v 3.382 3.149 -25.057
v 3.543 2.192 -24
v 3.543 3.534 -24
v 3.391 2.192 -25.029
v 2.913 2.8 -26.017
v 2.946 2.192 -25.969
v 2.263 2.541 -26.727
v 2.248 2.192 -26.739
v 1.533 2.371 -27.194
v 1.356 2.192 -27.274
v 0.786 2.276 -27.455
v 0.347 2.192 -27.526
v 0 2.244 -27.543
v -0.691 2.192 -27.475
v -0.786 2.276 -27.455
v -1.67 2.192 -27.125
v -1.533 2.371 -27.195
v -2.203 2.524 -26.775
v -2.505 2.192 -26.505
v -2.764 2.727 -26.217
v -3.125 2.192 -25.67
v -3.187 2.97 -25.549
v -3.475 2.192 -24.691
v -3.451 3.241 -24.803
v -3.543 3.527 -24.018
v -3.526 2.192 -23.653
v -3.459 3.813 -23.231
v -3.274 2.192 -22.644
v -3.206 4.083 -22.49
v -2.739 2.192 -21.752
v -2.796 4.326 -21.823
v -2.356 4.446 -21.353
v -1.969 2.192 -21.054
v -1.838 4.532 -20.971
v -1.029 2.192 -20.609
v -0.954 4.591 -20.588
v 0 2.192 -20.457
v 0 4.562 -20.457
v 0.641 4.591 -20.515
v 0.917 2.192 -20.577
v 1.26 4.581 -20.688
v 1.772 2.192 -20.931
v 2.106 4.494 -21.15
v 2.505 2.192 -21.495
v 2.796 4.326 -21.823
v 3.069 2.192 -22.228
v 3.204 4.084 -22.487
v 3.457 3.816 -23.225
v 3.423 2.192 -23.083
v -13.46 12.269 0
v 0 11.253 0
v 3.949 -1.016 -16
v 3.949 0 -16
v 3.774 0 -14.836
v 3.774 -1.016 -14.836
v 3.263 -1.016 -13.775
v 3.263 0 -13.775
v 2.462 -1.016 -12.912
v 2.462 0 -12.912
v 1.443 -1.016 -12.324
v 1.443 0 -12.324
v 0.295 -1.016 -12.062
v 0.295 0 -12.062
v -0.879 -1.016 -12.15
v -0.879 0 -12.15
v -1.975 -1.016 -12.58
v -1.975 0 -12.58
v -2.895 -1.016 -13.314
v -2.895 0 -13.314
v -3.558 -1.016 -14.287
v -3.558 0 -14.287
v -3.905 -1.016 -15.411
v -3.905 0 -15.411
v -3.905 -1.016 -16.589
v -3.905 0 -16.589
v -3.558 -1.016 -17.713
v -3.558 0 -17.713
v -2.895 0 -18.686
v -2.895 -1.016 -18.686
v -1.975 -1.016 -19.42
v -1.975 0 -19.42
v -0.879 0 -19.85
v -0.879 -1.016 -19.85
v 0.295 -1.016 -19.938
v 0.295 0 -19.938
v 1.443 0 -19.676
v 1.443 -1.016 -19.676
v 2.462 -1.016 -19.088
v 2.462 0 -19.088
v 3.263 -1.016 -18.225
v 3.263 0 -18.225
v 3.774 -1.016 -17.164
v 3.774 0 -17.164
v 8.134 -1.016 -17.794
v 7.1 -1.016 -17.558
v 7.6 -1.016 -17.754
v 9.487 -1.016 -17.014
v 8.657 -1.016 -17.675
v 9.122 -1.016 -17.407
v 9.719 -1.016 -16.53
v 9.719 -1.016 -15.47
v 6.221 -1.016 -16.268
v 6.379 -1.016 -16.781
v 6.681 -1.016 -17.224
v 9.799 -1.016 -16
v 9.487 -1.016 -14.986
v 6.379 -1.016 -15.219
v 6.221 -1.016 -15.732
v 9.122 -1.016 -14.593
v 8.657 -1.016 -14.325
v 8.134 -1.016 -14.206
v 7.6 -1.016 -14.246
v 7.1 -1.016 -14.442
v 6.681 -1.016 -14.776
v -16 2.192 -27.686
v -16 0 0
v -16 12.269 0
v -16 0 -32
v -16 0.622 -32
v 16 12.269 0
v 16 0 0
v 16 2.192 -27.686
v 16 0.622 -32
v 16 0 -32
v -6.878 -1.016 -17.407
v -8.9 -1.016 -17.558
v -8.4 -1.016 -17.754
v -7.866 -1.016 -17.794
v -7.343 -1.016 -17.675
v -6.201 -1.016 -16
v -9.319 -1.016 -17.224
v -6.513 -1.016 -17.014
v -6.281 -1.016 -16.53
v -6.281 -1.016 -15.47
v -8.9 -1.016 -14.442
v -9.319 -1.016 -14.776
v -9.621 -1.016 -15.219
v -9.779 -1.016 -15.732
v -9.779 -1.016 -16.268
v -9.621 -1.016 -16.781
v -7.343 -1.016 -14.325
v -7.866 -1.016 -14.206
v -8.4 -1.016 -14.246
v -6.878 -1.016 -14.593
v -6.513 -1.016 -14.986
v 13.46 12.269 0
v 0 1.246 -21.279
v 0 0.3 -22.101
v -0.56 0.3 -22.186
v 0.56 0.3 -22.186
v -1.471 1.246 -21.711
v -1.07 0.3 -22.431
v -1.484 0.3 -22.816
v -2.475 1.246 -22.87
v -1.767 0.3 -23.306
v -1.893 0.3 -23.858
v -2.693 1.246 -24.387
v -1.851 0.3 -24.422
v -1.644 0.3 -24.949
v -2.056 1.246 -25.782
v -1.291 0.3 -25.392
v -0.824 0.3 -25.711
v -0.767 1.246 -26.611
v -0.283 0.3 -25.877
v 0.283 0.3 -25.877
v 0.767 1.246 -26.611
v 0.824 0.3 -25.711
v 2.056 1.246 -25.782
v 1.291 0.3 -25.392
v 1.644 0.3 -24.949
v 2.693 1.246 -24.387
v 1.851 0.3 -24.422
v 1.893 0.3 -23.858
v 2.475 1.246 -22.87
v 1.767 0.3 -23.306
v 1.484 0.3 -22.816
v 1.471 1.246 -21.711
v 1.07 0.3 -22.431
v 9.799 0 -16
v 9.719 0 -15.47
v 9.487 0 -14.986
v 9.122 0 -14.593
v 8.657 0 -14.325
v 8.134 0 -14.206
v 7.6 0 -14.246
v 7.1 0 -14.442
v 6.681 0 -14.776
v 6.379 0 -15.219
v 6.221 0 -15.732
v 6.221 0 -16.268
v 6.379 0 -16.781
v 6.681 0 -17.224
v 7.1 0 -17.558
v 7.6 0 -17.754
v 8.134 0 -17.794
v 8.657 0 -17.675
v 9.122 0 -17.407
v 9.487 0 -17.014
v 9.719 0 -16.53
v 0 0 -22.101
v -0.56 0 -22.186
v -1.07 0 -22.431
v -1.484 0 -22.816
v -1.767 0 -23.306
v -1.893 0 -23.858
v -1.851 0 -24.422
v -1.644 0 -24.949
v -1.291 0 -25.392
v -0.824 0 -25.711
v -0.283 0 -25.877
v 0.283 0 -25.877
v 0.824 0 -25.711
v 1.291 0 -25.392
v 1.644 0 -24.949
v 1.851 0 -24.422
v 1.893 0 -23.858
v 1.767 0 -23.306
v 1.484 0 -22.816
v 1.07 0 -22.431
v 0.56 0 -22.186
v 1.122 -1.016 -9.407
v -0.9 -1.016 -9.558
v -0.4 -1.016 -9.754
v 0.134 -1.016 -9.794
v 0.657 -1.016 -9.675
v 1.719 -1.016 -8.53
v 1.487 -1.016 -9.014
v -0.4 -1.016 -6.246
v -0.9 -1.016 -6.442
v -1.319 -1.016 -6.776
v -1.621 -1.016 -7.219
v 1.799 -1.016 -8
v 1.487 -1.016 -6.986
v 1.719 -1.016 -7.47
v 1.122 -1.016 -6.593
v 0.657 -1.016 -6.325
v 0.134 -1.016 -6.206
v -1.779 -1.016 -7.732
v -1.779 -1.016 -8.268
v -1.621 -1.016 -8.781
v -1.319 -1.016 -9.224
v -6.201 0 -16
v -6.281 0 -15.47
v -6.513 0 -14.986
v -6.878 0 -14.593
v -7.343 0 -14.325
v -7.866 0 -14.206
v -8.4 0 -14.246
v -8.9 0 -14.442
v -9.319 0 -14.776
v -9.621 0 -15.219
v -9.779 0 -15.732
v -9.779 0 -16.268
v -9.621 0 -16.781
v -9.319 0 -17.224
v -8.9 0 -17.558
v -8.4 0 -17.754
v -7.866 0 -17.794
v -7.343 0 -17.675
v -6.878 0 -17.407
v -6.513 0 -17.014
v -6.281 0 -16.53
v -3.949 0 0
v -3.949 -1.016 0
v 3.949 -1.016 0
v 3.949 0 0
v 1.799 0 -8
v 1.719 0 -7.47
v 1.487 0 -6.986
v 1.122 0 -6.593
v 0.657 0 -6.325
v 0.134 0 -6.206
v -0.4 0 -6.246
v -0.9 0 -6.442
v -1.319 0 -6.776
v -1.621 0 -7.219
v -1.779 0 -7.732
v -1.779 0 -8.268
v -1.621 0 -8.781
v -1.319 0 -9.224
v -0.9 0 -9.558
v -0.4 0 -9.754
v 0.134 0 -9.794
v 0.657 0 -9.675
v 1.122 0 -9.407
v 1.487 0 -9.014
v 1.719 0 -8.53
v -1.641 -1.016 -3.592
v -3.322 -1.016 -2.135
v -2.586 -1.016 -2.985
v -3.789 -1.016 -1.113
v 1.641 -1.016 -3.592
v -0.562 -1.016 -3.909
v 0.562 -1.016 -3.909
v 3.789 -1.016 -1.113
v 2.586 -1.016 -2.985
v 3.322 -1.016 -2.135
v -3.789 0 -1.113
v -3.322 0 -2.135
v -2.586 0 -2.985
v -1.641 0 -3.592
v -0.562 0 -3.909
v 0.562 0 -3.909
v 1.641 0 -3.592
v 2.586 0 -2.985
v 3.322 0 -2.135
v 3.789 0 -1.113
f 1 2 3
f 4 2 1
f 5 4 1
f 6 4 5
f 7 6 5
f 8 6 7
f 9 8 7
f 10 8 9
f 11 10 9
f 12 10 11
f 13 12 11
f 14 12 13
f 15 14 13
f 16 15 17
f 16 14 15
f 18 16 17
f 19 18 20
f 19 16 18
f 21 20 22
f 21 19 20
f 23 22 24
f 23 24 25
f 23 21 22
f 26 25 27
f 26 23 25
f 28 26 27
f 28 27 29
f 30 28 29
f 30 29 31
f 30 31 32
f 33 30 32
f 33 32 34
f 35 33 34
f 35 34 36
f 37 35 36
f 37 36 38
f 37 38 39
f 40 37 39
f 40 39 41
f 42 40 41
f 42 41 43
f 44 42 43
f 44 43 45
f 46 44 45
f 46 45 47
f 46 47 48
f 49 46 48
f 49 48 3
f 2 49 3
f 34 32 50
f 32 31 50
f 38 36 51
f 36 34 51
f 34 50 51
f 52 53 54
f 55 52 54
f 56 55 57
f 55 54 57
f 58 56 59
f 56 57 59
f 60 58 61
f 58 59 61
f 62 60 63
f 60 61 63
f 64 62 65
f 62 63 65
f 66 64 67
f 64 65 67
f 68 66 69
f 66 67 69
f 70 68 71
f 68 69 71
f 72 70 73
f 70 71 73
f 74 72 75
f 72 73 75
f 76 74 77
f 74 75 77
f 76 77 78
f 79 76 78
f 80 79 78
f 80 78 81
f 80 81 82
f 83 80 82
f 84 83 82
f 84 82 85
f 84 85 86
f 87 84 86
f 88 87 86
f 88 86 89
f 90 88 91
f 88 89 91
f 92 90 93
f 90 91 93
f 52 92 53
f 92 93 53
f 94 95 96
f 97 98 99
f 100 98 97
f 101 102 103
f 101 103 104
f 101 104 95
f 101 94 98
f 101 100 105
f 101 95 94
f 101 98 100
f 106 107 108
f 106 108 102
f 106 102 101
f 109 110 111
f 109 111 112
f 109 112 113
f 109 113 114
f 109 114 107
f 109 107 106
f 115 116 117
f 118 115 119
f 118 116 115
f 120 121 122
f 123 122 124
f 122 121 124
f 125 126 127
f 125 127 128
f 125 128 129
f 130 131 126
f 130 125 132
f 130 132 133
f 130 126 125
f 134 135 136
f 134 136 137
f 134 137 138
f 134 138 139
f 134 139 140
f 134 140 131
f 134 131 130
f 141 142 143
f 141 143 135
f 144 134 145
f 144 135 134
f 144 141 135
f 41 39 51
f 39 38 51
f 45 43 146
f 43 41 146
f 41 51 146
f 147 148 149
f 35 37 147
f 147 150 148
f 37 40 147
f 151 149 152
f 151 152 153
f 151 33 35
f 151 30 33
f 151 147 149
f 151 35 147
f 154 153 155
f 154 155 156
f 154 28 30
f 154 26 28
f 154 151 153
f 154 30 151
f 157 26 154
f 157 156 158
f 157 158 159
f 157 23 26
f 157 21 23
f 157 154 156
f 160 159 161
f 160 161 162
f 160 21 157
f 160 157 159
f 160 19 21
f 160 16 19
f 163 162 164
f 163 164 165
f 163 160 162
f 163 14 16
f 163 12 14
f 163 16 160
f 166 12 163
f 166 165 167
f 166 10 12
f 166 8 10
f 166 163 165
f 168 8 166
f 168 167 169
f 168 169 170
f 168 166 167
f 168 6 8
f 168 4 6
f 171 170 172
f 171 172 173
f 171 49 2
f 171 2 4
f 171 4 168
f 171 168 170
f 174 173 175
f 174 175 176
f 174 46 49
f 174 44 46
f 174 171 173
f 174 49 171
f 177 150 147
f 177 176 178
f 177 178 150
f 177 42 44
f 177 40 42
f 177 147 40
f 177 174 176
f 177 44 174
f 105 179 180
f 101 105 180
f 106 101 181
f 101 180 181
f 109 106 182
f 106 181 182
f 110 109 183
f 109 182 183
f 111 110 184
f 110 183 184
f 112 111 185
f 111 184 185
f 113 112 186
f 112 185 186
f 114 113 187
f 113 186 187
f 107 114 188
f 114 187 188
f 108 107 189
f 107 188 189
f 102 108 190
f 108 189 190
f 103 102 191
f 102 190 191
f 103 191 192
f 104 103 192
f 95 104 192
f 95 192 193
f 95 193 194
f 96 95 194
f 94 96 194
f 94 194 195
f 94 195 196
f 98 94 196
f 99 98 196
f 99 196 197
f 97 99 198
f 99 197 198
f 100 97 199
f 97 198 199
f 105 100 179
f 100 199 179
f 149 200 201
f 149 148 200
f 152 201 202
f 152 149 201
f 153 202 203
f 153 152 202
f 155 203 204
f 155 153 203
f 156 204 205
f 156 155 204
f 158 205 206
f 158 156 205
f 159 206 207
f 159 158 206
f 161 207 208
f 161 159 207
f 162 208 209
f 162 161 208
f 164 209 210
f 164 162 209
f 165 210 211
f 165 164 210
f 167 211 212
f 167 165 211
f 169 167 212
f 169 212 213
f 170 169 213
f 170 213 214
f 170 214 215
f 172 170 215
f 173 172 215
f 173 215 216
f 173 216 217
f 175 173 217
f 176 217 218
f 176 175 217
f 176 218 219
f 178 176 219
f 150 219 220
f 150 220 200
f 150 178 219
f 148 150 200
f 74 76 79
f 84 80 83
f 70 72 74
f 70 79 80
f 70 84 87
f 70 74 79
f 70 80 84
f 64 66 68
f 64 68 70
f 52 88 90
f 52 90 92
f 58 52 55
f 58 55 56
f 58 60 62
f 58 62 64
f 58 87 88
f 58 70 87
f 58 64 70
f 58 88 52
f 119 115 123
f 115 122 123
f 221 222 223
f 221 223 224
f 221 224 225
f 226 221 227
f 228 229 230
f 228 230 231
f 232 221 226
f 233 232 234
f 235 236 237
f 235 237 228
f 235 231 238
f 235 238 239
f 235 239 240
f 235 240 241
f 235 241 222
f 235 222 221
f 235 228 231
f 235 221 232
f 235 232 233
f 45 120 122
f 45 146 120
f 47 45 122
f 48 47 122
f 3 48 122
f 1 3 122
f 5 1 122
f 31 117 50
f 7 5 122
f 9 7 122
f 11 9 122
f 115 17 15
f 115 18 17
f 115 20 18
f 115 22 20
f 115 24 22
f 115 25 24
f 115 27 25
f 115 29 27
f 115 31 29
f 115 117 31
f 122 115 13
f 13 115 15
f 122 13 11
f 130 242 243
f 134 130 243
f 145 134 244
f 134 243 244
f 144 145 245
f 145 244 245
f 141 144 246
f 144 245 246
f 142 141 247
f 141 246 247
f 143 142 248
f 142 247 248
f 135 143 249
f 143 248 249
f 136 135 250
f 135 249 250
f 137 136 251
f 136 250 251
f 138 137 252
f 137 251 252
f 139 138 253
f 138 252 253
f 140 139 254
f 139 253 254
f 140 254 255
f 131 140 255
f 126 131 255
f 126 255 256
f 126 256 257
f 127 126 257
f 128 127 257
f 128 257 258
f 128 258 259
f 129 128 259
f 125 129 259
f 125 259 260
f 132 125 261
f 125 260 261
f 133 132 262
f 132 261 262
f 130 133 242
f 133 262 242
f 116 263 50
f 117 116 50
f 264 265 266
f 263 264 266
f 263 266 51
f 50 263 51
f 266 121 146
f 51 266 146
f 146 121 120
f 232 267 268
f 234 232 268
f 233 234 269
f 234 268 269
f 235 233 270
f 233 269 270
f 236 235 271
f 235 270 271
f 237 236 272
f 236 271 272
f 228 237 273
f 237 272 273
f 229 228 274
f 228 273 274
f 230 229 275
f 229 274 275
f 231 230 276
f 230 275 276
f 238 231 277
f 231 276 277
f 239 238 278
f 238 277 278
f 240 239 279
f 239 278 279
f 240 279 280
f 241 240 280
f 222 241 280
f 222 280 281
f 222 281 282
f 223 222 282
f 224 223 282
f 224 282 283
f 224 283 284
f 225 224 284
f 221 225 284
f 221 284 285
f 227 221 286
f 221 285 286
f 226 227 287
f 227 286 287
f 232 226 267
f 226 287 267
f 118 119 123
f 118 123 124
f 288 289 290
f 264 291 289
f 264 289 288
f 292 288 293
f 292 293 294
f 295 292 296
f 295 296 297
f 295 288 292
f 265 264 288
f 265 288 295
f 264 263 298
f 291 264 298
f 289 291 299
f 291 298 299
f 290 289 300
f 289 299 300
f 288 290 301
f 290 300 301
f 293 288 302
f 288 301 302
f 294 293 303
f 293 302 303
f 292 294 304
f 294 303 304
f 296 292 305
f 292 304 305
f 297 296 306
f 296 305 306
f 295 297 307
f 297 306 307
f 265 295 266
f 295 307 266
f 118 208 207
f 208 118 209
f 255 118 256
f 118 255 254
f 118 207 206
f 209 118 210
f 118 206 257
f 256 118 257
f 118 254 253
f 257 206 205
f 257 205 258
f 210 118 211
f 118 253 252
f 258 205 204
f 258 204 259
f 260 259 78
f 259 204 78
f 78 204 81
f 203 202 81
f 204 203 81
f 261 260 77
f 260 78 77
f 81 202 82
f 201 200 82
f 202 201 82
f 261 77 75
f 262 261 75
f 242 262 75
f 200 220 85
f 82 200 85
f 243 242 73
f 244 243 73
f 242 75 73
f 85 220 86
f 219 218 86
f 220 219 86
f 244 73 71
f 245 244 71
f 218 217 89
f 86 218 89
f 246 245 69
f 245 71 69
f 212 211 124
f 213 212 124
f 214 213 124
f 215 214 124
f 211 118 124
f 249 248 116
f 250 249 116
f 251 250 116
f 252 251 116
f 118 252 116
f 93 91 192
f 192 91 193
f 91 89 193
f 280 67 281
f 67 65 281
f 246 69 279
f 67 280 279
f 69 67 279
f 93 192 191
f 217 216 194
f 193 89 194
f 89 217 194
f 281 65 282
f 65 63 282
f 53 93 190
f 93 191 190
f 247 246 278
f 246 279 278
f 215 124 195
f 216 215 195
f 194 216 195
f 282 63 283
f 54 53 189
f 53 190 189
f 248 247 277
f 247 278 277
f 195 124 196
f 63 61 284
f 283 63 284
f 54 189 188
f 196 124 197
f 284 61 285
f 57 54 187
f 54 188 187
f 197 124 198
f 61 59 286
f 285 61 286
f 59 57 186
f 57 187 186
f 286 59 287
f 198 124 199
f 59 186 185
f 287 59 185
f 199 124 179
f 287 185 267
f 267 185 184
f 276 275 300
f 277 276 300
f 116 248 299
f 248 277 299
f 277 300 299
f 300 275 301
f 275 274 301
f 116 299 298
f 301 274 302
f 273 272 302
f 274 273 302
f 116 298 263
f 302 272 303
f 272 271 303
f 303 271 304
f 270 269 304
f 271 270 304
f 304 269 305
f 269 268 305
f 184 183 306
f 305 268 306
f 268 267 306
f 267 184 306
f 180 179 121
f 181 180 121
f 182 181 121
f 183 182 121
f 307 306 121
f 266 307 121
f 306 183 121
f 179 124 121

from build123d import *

# Parameters (mm, degrees)
BOSS_EXTRUDE1_DEPTH = 16
BOSS_EXTRUDE2_REACH = 39.169
SKETCH6_W           = 32
SKETCH6_H           = 7.878
SKETCH6_R           = 3.5433
SKETCH7_R           = 1.7992
SKETCH7_R_2         = 3.9492
BOSS_EXTRUDE3_DEPTH = 1.016
CUT_EXTRUDE1_DEPTH  = 40.8462222


with BuildPart() as part:
    # Sketch1 → Boss-Extrude1 (new, symmetric)
    with BuildSketch(Plane(origin=(0, 0, 0), x_dir=(0, 0, -1), z_dir=(1, 0, 0))):
        Polygon((19.808, 5.059429759), (19.808, 2.192072254), (27.686, 2.192072254), (32, 0.621904663), (32, 0), (0, 0), (0, 12.26895216), align=None)
    extrude(amount=BOSS_EXTRUDE1_DEPTH, both=True)

    # Sketch5 → CSK for #6 Flat Head Machine Screw1 (revolve, cut)
    with BuildSketch(Plane(origin=(0, 2.192072254, -24), x_dir=(0, 0, 1), z_dir=(1, 0, 0))):
        Polygon((0, 0), (0, 2.192072254), (1.89865, 2.192072254), (1.89865, 1.891953401), (3.5433, 0), align=None)
    revolve(axis=Axis((0, 8.542072254, -24), (0, -1, 0)), mode=Mode.SUBTRACT)

    # Boss-Extrude2: up to this face of the body (flat: up to its plane)
    boss_extrude2_end = Plane(part.part.faces().sort_by_distance((0, 8.664190959, -9.904))[0])
    # Sketch6 → Boss-Extrude2 (add, up to the picked face)
    with BuildSketch(Plane(origin=(0, 2.192072254, 0), x_dir=(1, 0, 0), z_dir=(0, 1, 0)), mode=Mode.PRIVATE) as boss_extrude2_sk1:
        with Locations((0, 23.747)):
            Rectangle(SKETCH6_W, SKETCH6_H)
        with Locations((0, 24)):
            Circle(SKETCH6_R, mode=Mode.SUBTRACT)
    boss_extrude2_tool1 = split(extrude(boss_extrude2_sk1.sketch, amount=BOSS_EXTRUDE2_REACH, mode=Mode.PRIVATE), bisect_by=boss_extrude2_end, keep=Keep.BOTH, mode=Mode.PRIVATE)
    add(boss_extrude2_tool1.solids().sort_by(Axis((-15.670445, 2.192072, -23.747), (0, 1, 0)))[0])

    # Sketch7 → Boss-Extrude3 (add)
    with BuildSketch(Plane.XZ):
        with Locations((8, -16)):
            Circle(SKETCH7_R)
        with Locations((0, -16)):
            Circle(SKETCH7_R_2)
        with Locations((-8, -16)):
            Circle(SKETCH7_R)
        with Locations((0, -8)):
            Circle(SKETCH7_R)
        with BuildLine():
            Line((3.9492, 0), (-3.9492, 0))
            ThreePointArc((-3.9492, 0), (0, -3.9492), (3.9492, 0))
        make_face()
    extrude(amount=BOSS_EXTRUDE3_DEPTH)

    # Sketch9 → Cut-Extrude1 (cut, through all, along a direction that is not the sketch's normal)
    with BuildSketch(Plane.XY):
        Polygon((-13.46, 12.26895216), (0, 11.25295216), (13.46, 12.26895216), align=None)
    extrude(amount=-CUT_EXTRUDE1_DEPTH, dir=(0, 0.3108760554921047, 0.9504504606352032), mode=Mode.SUBTRACT)


solid = part.part
